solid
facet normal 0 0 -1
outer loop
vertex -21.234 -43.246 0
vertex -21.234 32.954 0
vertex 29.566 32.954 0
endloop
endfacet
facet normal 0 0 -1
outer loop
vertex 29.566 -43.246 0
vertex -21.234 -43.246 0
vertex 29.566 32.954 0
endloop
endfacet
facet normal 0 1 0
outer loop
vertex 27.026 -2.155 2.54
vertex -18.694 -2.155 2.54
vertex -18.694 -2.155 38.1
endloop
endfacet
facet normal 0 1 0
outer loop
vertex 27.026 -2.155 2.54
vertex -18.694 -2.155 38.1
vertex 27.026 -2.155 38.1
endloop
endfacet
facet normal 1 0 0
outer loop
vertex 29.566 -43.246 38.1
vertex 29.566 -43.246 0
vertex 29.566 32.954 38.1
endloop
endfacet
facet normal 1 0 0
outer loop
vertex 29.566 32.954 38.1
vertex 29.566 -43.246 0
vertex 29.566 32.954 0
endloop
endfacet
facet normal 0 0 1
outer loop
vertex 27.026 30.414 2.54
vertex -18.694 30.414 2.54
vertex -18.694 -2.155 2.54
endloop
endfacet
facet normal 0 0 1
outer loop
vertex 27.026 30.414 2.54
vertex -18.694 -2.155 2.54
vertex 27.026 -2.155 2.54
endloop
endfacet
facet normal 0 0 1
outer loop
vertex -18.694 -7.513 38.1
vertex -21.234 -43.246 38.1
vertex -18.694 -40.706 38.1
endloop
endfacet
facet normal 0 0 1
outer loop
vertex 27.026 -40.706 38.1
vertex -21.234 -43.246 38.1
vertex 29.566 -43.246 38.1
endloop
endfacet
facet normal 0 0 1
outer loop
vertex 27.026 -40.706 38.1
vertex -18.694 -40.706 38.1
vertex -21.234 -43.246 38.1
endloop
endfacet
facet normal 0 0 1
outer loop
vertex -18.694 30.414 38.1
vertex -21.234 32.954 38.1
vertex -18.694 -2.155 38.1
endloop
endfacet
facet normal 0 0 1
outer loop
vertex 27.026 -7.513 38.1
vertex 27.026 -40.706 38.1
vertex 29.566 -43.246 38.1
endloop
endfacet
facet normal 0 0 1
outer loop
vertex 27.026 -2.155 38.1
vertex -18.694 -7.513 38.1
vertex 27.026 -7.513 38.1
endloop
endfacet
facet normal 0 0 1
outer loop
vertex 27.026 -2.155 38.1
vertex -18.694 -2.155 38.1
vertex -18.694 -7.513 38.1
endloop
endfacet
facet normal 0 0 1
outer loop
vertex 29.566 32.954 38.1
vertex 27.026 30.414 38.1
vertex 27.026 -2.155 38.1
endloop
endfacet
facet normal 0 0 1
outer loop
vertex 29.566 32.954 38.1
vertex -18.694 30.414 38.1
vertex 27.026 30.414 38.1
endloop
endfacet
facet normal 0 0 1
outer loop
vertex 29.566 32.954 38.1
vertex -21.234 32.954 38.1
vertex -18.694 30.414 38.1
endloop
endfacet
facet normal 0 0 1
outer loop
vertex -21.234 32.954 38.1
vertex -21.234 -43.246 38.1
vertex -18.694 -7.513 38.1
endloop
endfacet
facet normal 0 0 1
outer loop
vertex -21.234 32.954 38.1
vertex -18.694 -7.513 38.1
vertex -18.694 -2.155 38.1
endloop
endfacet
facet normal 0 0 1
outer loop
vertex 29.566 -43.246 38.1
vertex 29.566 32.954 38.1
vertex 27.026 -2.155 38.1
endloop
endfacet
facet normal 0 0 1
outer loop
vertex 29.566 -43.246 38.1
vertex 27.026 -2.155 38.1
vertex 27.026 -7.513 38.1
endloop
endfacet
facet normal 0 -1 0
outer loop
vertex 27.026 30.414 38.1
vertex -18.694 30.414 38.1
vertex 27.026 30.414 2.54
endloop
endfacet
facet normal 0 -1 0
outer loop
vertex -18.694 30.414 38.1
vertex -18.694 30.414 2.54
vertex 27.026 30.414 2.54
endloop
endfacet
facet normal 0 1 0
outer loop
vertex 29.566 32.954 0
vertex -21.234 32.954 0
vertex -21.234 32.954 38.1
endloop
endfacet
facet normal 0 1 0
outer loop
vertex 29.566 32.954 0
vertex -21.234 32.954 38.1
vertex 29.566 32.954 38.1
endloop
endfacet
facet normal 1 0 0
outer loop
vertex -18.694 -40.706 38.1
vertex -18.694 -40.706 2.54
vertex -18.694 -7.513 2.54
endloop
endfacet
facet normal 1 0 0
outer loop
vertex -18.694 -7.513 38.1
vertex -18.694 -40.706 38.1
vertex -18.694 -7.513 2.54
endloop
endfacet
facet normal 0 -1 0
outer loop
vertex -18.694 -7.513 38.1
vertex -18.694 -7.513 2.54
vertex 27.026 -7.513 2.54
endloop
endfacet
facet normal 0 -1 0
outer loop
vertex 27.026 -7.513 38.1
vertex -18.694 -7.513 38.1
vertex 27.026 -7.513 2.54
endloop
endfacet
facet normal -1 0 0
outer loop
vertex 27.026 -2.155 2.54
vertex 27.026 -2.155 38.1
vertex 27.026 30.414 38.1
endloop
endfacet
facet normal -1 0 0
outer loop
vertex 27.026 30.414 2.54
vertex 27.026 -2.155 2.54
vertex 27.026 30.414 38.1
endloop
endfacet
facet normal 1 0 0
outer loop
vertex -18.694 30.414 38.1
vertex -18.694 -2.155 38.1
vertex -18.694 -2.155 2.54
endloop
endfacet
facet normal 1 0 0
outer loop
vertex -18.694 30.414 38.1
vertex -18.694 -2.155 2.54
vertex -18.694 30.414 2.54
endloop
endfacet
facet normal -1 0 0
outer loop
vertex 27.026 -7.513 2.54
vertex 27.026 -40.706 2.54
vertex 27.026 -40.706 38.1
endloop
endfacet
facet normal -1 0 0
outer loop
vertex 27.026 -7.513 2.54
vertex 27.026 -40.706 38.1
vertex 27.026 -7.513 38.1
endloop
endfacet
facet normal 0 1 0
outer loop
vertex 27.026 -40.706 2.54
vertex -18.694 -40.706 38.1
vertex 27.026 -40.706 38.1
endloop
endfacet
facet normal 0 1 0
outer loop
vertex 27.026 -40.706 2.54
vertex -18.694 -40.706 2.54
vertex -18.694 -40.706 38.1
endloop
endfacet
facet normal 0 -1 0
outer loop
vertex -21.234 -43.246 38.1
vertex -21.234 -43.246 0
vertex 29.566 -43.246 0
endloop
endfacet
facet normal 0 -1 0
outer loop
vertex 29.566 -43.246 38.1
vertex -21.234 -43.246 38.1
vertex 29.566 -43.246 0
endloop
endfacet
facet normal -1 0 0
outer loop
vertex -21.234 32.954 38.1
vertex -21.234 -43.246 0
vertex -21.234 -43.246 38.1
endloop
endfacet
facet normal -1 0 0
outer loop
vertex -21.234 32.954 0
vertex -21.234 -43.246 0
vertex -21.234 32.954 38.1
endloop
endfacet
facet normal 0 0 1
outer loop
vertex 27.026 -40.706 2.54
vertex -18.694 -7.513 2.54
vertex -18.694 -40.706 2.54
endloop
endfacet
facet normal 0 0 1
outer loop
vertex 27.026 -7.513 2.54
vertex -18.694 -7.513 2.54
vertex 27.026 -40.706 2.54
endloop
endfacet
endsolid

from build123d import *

# Parameters (mm, degrees)
F0_W     = 50.8
F0_H     = 76.200003
F1_DEPTH = 38.1
F2_T     = -2.54
F3_W     = 45.72
F3_H     = 2.990683
F3_H_2   = 2.366999
F4_DEPTH = 35.56


with BuildPart() as f1:
    # F0 (on Top) → F1 (new body)
    with BuildSketch(Plane.XY):
        with Locations((4.165911, -5.146126)):
            Rectangle(F0_W, F0_H)
    extrude(amount=F1_DEPTH)

    # F2
    f2_openings = [f1.faces().sort_by_distance(p)[0] for p in [
        (4.165911, -5.146125, 38.1),
    ]]
    offset(amount=F2_T, openings=f2_openings)

    # F3 (on face) → F4 (join)
    with BuildSketch(Plane.XY.offset(2.54)):
        with Locations((4.165911, -3.650783)):
            Rectangle(F3_W, F3_H)
        with Locations((4.165911, -6.329624)):
            Rectangle(F3_W, F3_H_2)
    extrude(amount=F4_DEPTH)


solid = f1.part
